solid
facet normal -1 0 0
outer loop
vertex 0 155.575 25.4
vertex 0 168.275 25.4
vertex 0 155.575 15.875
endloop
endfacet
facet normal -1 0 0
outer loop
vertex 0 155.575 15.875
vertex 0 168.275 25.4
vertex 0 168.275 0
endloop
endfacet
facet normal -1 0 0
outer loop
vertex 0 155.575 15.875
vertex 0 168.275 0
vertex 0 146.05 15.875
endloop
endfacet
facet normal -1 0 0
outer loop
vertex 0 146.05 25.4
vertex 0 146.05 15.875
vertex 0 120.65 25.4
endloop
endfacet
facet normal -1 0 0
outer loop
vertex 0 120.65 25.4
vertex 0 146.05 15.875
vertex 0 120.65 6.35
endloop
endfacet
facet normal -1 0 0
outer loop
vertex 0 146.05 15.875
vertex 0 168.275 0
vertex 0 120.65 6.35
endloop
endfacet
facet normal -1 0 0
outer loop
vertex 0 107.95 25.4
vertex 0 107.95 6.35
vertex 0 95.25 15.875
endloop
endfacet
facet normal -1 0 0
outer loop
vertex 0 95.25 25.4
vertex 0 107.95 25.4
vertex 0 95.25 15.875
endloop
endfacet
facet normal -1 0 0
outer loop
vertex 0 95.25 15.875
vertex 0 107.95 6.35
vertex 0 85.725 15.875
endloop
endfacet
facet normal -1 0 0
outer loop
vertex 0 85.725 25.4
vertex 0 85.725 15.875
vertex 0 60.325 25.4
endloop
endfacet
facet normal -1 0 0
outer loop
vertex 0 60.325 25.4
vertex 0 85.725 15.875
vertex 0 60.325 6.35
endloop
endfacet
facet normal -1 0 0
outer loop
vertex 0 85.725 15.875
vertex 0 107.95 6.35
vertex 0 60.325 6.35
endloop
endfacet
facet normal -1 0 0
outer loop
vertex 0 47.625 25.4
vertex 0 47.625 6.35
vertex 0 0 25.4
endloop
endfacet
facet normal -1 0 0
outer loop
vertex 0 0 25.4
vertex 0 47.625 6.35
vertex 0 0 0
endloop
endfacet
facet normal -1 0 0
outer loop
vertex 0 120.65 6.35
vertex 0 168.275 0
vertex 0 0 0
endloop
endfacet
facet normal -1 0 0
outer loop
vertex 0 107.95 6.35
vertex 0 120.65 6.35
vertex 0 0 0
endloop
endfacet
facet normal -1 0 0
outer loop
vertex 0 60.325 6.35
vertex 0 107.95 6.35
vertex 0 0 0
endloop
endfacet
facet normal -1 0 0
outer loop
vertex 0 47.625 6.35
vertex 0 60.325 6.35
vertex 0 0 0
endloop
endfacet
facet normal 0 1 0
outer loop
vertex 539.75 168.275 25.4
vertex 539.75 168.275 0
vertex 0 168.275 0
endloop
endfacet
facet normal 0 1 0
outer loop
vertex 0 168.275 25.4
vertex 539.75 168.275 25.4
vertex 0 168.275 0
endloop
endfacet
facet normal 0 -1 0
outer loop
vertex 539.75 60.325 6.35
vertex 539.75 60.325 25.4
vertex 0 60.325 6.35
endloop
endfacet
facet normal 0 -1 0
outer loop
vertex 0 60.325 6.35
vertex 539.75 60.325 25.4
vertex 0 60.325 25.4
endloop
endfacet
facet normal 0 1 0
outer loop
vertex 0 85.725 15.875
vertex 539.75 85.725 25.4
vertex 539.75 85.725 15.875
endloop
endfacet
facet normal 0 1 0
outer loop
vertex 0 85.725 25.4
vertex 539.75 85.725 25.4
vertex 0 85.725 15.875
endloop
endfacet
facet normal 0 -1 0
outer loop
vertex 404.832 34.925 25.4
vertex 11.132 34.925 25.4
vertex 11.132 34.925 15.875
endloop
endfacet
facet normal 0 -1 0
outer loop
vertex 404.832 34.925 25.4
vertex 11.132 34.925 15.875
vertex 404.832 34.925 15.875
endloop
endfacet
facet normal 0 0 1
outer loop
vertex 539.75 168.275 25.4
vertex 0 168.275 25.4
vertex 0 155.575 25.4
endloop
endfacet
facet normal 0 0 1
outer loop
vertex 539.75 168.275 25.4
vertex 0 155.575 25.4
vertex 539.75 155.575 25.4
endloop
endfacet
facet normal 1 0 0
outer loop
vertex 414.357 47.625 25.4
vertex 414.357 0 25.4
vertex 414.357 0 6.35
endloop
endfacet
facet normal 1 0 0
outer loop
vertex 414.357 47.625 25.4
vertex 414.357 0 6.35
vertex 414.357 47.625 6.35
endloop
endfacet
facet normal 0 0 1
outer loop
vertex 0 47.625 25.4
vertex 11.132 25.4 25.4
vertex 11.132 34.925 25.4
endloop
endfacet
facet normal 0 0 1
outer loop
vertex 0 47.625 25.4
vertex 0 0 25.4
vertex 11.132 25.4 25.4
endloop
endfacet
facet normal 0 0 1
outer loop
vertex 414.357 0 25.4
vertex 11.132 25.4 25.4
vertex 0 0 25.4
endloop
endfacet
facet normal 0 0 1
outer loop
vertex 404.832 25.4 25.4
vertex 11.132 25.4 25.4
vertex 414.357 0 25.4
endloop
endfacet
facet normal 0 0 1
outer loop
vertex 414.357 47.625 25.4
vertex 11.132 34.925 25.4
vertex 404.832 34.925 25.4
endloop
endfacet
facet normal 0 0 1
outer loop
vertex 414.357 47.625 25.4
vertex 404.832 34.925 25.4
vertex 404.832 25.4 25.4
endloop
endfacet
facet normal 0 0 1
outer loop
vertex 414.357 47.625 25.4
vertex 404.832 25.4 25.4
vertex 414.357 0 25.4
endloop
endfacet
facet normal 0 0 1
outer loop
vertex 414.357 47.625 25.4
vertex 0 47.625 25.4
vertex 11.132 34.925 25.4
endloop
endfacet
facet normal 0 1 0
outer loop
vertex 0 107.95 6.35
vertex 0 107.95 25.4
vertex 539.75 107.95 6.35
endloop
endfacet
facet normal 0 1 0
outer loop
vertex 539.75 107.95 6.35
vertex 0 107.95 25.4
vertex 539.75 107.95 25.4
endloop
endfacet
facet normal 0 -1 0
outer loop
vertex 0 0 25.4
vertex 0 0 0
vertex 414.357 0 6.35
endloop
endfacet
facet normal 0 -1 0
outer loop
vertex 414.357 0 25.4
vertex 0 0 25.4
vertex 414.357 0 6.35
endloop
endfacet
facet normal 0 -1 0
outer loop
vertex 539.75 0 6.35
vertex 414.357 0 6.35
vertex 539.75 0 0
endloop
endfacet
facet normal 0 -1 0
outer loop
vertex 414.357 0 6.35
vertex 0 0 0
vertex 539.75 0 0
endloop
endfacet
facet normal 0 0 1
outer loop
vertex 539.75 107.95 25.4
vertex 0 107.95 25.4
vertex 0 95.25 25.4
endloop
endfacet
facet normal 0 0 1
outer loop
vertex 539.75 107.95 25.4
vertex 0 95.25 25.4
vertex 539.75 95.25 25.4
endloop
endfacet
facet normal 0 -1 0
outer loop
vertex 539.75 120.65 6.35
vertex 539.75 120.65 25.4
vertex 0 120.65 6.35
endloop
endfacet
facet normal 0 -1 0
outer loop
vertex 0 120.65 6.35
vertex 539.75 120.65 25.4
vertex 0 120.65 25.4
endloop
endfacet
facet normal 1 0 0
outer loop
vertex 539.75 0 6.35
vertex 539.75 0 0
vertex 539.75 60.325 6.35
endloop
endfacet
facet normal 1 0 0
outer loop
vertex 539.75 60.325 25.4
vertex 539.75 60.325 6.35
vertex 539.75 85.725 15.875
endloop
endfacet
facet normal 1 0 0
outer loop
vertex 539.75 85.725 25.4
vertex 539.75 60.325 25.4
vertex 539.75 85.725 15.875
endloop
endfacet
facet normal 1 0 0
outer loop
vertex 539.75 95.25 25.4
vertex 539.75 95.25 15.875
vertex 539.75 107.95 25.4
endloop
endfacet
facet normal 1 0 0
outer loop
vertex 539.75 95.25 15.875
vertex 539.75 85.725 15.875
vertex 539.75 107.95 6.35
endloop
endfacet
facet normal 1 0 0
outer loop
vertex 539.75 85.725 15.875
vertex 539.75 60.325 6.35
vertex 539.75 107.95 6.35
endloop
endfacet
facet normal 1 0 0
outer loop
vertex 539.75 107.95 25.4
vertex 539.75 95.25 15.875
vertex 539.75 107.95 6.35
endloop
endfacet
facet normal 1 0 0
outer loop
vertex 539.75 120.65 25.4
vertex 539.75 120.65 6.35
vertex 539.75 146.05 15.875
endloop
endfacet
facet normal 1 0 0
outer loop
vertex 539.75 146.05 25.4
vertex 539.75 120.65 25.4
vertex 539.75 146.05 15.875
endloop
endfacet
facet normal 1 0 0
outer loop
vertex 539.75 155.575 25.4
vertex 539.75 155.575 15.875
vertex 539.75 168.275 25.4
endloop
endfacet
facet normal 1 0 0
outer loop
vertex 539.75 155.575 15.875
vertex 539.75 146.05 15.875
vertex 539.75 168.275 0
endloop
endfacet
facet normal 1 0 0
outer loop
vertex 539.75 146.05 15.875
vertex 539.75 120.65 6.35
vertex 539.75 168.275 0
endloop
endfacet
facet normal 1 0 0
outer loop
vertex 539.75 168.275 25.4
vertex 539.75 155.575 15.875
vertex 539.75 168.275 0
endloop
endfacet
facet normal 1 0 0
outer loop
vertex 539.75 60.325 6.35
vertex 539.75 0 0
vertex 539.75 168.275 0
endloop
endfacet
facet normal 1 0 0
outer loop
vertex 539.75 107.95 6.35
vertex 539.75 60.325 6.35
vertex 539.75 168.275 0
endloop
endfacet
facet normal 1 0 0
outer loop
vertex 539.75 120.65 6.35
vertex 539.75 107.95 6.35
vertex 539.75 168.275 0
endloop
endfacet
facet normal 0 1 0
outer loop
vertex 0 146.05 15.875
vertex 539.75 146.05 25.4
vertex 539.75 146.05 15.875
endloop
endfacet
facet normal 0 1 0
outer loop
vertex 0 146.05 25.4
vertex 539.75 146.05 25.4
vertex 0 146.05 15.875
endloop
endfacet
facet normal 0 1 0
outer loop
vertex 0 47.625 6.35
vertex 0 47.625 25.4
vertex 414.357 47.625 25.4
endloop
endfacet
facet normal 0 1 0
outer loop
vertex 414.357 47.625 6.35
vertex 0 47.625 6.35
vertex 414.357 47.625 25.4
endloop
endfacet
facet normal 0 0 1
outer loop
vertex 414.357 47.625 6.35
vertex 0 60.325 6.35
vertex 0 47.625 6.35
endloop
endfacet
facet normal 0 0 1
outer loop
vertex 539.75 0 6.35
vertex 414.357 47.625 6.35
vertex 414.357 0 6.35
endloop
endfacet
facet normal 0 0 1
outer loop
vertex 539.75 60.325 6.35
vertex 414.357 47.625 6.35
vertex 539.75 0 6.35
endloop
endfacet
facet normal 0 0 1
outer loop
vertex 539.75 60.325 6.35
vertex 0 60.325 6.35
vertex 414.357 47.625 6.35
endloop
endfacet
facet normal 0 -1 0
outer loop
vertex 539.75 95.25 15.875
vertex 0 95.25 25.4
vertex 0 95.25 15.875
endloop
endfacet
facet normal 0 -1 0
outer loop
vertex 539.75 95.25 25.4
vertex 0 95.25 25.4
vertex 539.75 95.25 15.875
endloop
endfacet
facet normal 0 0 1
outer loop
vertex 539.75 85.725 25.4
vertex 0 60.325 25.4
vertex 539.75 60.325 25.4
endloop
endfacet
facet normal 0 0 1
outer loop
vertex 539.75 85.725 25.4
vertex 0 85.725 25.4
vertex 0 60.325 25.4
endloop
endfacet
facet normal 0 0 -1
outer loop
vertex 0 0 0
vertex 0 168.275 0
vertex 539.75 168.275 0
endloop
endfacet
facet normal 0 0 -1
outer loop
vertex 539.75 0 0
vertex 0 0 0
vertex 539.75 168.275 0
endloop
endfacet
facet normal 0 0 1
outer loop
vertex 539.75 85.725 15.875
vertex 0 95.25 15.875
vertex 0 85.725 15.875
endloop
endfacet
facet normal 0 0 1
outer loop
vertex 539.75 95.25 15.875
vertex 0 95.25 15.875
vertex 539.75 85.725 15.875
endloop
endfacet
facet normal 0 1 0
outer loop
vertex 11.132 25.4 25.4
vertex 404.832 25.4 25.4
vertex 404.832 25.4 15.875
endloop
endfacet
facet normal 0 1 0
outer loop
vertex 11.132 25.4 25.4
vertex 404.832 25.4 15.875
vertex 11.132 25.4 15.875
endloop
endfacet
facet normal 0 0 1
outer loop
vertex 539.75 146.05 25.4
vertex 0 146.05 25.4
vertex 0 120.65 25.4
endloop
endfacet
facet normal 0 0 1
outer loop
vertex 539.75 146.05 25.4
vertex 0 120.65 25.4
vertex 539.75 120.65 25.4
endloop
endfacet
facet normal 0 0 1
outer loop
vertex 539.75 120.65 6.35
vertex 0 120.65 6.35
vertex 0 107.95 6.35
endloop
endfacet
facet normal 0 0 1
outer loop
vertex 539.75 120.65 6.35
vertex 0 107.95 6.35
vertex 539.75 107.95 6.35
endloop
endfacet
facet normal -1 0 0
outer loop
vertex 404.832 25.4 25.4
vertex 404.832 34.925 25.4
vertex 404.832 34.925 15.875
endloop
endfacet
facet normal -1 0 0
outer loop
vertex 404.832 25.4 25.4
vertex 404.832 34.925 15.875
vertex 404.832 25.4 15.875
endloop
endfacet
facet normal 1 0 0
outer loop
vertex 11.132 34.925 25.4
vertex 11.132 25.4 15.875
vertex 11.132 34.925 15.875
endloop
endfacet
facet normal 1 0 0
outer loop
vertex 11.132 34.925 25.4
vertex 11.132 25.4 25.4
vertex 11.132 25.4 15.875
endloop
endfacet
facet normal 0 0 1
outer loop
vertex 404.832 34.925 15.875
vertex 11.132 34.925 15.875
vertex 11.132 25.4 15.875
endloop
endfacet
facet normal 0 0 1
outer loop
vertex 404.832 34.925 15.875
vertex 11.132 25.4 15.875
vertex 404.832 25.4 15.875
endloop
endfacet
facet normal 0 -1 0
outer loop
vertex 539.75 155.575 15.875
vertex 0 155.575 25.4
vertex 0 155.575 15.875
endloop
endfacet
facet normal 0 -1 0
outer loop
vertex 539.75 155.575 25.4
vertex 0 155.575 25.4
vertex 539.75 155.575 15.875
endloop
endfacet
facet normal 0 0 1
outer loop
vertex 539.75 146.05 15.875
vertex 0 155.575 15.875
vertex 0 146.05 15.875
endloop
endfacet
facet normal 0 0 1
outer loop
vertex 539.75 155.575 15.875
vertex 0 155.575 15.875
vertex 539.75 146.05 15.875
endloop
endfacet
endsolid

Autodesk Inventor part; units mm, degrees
ref_plane "YZ Plane" through (0, 0, 0) normal (1, 0, 0) x (0, 1, 0)
ref_plane "XZ Plane" through (0, 0, 0) normal (0, 1, 0) x (-1, 0, 0)
sketch "Sketch1" plane through (0, 0, 0) normal (0, 0, 1) x (1, 0, 0)
  line L0 (0, 0) -> (539.75, 0)
  line L1 (539.75, 0) -> (539.75, 168.275)
  line L2 (539.75, 168.275) -> (0, 168.275)
  line L3 (0, 168.275) -> (0, 0)
  dimension "d0" = 539.75
  dimension "d1" = 168.275
extrude "Extrusion1" add sketch "Sketch1" along normal blind 25.4
sketch "Sketch2" plane through (0, 0, 25.4) normal (0, 0, 1) x (1, 0, 0)
  line L0 (539.75, 0) -> (539.75, 168.275) projected
  line L1 (0, 168.275) -> (0, 0) projected
  line L2 (0, 168.275) -> (539.75, 168.275)
  line L3 (539.75, 168.275) -> (539.75, 120.65)
  line L4 (539.75, 120.65) -> (0, 120.65)
  line L5 (0, 120.65) -> (0, 168.275)
  line L6 (0, 107.95) -> (539.75, 107.95)
  line L7 (539.75, 107.95) -> (539.75, 60.325)
  line L8 (539.75, 60.325) -> (0, 60.325)
  line L9 (0, 60.325) -> (0, 107.95)
  line L10 (0, 47.625) -> (539.75, 47.625)
  line L11 (539.75, 47.625) -> (539.75, 0)
  line L12 (539.75, 0) -> (0, 0)
  line L13 (0, 0) -> (0, 47.625)
  line L14 (0, 120.65) -> (539.75, 120.65)
  line L15 (539.75, 120.65) -> (539.75, 107.95)
  line L16 (539.75, 107.95) -> (0, 107.95)
  line L17 (0, 107.95) -> (0, 120.65)
  line L18 (539.75, 60.325) -> (0, 60.325)
  line L19 (0, 60.325) -> (0, 47.625)
  line L20 (0, 47.625) -> (539.75, 47.625)
  line L21 (539.75, 47.625) -> (539.75, 60.325)
  dimension "d4" = 47.625
  dimension "d5" = 47.625
  dimension "d6" = 47.625
  dimension "d7" = 12.7
  dimension "d8" = 12.7
extrude "Extrusion3" cut sketch "Sketch2" against normal blind 19.05 contours L10 L1 L8 L0 | L6 L1 L4 L0
sketch "Sketch3" plane through (0, 0, 25.4) normal (0, 0, 1) x (1, 0, 0)
  line L0 (0, 120.65) -> (539.75, 120.65) projected
  line L1 (539.75, 120.65) -> (539.75, 168.275) projected
  line L2 (539.75, 168.275) -> (0, 168.275) projected
  line L3 (0, 168.275) -> (0, 120.65) projected
  line L4 (0, 155.575) -> (539.75, 155.575)
  line L5 (539.75, 155.575) -> (539.75, 146.05)
  line L6 (539.75, 146.05) -> (0, 146.05)
  line L7 (0, 146.05) -> (0, 155.575)
  line L8 (0, 107.95) -> (558.8, 107.95)
  line L9 (558.8, 107.95) -> (558.8, 60.325)
  line L10 (558.8, 60.325) -> (0, 60.325)
  line L11 (0, 60.325) -> (0, 107.95)
  line L12 (1.6074, 47.625) -> (558.8, 47.625)
  line L13 (558.8, 47.625) -> (558.8, 0)
  line L14 (558.8, 0) -> (1.6074, 0)
  line L15 (1.6074, 0) -> (1.6074, 47.625)
  line L16 (0, 95.25) -> (558.8, 95.25)
  line L17 (558.8, 95.25) -> (558.8, 85.725)
  line L18 (558.8, 85.725) -> (0, 85.725)
  line L19 (0, 85.725) -> (0, 95.25)
  line L20 (11.1324, 34.925) -> (404.8324, 34.925)
  line L21 (404.8324, 34.925) -> (404.8324, 25.4)
  line L22 (404.8324, 25.4) -> (11.1324, 25.4)
  line L23 (11.1324, 25.4) -> (11.1324, 34.925)
  line L24 (558.8, 47.625) -> (414.3574, 47.625)
  line L25 (414.3574, 47.625) -> (414.3574, 0)
  line L26 (414.3574, 0) -> (558.8, 0)
  line L27 (558.8, 0) -> (558.8, 47.625)
  point P0 (0, 0)
  dimension "d13" = 9.525
  dimension "d14" = 12.7
  dimension "d15" = 25.4
  dimension "d16" = 12.7
  dimension "d17" = 12.7
  dimension "d18" = 47.625
  dimension "d19" = 47.625
  dimension "d20" = 9.525
  dimension "d21" = 12.7
  dimension "d22" = 393.7
  dimension "d23" = 412.75
  dimension "d24" = 9.525
  dimension "d25" = 9.525
  dimension "d26" = 9.525
  dimension "d27" = 12.7
  dimension "d28" = 539.75
ref_plane "Work Plane1" through (0, 0, 15.875) normal (0, 0, 1) x (1, 0, 0)
sketch "Sketch5" plane through (0, 0, 15.875) normal (0, 0, 1) x (1, 0, 0)
  line L0 (539.75, 47.625) -> (539.75, 0) projected
  line L1 (414.3574, 47.625) -> (539.75, 47.625) projected
  line L2 (414.3574, 0) -> (414.3574, 47.625) projected
  line L3 (539.75, 0) -> (414.3574, 0) projected
  point P0 (0, 0)
extrude "Extrusion5" cut sketch "Sketch5" against normal blind 9.525
extrude "Extrusion7" cut sketch "Sketch3" against normal blind 9.525 contours L3 L4 L1 L6 | L16 L9 L18 L11 | L12 L13 L14 L25 | L20 L21 L22 L23
equation "\"d7\" = d8"
equation "\"d19\" = d18"
equation "\"d24\" = d25"
properties part number "ply75_bottom_board" material "Wood (Cherry)"
